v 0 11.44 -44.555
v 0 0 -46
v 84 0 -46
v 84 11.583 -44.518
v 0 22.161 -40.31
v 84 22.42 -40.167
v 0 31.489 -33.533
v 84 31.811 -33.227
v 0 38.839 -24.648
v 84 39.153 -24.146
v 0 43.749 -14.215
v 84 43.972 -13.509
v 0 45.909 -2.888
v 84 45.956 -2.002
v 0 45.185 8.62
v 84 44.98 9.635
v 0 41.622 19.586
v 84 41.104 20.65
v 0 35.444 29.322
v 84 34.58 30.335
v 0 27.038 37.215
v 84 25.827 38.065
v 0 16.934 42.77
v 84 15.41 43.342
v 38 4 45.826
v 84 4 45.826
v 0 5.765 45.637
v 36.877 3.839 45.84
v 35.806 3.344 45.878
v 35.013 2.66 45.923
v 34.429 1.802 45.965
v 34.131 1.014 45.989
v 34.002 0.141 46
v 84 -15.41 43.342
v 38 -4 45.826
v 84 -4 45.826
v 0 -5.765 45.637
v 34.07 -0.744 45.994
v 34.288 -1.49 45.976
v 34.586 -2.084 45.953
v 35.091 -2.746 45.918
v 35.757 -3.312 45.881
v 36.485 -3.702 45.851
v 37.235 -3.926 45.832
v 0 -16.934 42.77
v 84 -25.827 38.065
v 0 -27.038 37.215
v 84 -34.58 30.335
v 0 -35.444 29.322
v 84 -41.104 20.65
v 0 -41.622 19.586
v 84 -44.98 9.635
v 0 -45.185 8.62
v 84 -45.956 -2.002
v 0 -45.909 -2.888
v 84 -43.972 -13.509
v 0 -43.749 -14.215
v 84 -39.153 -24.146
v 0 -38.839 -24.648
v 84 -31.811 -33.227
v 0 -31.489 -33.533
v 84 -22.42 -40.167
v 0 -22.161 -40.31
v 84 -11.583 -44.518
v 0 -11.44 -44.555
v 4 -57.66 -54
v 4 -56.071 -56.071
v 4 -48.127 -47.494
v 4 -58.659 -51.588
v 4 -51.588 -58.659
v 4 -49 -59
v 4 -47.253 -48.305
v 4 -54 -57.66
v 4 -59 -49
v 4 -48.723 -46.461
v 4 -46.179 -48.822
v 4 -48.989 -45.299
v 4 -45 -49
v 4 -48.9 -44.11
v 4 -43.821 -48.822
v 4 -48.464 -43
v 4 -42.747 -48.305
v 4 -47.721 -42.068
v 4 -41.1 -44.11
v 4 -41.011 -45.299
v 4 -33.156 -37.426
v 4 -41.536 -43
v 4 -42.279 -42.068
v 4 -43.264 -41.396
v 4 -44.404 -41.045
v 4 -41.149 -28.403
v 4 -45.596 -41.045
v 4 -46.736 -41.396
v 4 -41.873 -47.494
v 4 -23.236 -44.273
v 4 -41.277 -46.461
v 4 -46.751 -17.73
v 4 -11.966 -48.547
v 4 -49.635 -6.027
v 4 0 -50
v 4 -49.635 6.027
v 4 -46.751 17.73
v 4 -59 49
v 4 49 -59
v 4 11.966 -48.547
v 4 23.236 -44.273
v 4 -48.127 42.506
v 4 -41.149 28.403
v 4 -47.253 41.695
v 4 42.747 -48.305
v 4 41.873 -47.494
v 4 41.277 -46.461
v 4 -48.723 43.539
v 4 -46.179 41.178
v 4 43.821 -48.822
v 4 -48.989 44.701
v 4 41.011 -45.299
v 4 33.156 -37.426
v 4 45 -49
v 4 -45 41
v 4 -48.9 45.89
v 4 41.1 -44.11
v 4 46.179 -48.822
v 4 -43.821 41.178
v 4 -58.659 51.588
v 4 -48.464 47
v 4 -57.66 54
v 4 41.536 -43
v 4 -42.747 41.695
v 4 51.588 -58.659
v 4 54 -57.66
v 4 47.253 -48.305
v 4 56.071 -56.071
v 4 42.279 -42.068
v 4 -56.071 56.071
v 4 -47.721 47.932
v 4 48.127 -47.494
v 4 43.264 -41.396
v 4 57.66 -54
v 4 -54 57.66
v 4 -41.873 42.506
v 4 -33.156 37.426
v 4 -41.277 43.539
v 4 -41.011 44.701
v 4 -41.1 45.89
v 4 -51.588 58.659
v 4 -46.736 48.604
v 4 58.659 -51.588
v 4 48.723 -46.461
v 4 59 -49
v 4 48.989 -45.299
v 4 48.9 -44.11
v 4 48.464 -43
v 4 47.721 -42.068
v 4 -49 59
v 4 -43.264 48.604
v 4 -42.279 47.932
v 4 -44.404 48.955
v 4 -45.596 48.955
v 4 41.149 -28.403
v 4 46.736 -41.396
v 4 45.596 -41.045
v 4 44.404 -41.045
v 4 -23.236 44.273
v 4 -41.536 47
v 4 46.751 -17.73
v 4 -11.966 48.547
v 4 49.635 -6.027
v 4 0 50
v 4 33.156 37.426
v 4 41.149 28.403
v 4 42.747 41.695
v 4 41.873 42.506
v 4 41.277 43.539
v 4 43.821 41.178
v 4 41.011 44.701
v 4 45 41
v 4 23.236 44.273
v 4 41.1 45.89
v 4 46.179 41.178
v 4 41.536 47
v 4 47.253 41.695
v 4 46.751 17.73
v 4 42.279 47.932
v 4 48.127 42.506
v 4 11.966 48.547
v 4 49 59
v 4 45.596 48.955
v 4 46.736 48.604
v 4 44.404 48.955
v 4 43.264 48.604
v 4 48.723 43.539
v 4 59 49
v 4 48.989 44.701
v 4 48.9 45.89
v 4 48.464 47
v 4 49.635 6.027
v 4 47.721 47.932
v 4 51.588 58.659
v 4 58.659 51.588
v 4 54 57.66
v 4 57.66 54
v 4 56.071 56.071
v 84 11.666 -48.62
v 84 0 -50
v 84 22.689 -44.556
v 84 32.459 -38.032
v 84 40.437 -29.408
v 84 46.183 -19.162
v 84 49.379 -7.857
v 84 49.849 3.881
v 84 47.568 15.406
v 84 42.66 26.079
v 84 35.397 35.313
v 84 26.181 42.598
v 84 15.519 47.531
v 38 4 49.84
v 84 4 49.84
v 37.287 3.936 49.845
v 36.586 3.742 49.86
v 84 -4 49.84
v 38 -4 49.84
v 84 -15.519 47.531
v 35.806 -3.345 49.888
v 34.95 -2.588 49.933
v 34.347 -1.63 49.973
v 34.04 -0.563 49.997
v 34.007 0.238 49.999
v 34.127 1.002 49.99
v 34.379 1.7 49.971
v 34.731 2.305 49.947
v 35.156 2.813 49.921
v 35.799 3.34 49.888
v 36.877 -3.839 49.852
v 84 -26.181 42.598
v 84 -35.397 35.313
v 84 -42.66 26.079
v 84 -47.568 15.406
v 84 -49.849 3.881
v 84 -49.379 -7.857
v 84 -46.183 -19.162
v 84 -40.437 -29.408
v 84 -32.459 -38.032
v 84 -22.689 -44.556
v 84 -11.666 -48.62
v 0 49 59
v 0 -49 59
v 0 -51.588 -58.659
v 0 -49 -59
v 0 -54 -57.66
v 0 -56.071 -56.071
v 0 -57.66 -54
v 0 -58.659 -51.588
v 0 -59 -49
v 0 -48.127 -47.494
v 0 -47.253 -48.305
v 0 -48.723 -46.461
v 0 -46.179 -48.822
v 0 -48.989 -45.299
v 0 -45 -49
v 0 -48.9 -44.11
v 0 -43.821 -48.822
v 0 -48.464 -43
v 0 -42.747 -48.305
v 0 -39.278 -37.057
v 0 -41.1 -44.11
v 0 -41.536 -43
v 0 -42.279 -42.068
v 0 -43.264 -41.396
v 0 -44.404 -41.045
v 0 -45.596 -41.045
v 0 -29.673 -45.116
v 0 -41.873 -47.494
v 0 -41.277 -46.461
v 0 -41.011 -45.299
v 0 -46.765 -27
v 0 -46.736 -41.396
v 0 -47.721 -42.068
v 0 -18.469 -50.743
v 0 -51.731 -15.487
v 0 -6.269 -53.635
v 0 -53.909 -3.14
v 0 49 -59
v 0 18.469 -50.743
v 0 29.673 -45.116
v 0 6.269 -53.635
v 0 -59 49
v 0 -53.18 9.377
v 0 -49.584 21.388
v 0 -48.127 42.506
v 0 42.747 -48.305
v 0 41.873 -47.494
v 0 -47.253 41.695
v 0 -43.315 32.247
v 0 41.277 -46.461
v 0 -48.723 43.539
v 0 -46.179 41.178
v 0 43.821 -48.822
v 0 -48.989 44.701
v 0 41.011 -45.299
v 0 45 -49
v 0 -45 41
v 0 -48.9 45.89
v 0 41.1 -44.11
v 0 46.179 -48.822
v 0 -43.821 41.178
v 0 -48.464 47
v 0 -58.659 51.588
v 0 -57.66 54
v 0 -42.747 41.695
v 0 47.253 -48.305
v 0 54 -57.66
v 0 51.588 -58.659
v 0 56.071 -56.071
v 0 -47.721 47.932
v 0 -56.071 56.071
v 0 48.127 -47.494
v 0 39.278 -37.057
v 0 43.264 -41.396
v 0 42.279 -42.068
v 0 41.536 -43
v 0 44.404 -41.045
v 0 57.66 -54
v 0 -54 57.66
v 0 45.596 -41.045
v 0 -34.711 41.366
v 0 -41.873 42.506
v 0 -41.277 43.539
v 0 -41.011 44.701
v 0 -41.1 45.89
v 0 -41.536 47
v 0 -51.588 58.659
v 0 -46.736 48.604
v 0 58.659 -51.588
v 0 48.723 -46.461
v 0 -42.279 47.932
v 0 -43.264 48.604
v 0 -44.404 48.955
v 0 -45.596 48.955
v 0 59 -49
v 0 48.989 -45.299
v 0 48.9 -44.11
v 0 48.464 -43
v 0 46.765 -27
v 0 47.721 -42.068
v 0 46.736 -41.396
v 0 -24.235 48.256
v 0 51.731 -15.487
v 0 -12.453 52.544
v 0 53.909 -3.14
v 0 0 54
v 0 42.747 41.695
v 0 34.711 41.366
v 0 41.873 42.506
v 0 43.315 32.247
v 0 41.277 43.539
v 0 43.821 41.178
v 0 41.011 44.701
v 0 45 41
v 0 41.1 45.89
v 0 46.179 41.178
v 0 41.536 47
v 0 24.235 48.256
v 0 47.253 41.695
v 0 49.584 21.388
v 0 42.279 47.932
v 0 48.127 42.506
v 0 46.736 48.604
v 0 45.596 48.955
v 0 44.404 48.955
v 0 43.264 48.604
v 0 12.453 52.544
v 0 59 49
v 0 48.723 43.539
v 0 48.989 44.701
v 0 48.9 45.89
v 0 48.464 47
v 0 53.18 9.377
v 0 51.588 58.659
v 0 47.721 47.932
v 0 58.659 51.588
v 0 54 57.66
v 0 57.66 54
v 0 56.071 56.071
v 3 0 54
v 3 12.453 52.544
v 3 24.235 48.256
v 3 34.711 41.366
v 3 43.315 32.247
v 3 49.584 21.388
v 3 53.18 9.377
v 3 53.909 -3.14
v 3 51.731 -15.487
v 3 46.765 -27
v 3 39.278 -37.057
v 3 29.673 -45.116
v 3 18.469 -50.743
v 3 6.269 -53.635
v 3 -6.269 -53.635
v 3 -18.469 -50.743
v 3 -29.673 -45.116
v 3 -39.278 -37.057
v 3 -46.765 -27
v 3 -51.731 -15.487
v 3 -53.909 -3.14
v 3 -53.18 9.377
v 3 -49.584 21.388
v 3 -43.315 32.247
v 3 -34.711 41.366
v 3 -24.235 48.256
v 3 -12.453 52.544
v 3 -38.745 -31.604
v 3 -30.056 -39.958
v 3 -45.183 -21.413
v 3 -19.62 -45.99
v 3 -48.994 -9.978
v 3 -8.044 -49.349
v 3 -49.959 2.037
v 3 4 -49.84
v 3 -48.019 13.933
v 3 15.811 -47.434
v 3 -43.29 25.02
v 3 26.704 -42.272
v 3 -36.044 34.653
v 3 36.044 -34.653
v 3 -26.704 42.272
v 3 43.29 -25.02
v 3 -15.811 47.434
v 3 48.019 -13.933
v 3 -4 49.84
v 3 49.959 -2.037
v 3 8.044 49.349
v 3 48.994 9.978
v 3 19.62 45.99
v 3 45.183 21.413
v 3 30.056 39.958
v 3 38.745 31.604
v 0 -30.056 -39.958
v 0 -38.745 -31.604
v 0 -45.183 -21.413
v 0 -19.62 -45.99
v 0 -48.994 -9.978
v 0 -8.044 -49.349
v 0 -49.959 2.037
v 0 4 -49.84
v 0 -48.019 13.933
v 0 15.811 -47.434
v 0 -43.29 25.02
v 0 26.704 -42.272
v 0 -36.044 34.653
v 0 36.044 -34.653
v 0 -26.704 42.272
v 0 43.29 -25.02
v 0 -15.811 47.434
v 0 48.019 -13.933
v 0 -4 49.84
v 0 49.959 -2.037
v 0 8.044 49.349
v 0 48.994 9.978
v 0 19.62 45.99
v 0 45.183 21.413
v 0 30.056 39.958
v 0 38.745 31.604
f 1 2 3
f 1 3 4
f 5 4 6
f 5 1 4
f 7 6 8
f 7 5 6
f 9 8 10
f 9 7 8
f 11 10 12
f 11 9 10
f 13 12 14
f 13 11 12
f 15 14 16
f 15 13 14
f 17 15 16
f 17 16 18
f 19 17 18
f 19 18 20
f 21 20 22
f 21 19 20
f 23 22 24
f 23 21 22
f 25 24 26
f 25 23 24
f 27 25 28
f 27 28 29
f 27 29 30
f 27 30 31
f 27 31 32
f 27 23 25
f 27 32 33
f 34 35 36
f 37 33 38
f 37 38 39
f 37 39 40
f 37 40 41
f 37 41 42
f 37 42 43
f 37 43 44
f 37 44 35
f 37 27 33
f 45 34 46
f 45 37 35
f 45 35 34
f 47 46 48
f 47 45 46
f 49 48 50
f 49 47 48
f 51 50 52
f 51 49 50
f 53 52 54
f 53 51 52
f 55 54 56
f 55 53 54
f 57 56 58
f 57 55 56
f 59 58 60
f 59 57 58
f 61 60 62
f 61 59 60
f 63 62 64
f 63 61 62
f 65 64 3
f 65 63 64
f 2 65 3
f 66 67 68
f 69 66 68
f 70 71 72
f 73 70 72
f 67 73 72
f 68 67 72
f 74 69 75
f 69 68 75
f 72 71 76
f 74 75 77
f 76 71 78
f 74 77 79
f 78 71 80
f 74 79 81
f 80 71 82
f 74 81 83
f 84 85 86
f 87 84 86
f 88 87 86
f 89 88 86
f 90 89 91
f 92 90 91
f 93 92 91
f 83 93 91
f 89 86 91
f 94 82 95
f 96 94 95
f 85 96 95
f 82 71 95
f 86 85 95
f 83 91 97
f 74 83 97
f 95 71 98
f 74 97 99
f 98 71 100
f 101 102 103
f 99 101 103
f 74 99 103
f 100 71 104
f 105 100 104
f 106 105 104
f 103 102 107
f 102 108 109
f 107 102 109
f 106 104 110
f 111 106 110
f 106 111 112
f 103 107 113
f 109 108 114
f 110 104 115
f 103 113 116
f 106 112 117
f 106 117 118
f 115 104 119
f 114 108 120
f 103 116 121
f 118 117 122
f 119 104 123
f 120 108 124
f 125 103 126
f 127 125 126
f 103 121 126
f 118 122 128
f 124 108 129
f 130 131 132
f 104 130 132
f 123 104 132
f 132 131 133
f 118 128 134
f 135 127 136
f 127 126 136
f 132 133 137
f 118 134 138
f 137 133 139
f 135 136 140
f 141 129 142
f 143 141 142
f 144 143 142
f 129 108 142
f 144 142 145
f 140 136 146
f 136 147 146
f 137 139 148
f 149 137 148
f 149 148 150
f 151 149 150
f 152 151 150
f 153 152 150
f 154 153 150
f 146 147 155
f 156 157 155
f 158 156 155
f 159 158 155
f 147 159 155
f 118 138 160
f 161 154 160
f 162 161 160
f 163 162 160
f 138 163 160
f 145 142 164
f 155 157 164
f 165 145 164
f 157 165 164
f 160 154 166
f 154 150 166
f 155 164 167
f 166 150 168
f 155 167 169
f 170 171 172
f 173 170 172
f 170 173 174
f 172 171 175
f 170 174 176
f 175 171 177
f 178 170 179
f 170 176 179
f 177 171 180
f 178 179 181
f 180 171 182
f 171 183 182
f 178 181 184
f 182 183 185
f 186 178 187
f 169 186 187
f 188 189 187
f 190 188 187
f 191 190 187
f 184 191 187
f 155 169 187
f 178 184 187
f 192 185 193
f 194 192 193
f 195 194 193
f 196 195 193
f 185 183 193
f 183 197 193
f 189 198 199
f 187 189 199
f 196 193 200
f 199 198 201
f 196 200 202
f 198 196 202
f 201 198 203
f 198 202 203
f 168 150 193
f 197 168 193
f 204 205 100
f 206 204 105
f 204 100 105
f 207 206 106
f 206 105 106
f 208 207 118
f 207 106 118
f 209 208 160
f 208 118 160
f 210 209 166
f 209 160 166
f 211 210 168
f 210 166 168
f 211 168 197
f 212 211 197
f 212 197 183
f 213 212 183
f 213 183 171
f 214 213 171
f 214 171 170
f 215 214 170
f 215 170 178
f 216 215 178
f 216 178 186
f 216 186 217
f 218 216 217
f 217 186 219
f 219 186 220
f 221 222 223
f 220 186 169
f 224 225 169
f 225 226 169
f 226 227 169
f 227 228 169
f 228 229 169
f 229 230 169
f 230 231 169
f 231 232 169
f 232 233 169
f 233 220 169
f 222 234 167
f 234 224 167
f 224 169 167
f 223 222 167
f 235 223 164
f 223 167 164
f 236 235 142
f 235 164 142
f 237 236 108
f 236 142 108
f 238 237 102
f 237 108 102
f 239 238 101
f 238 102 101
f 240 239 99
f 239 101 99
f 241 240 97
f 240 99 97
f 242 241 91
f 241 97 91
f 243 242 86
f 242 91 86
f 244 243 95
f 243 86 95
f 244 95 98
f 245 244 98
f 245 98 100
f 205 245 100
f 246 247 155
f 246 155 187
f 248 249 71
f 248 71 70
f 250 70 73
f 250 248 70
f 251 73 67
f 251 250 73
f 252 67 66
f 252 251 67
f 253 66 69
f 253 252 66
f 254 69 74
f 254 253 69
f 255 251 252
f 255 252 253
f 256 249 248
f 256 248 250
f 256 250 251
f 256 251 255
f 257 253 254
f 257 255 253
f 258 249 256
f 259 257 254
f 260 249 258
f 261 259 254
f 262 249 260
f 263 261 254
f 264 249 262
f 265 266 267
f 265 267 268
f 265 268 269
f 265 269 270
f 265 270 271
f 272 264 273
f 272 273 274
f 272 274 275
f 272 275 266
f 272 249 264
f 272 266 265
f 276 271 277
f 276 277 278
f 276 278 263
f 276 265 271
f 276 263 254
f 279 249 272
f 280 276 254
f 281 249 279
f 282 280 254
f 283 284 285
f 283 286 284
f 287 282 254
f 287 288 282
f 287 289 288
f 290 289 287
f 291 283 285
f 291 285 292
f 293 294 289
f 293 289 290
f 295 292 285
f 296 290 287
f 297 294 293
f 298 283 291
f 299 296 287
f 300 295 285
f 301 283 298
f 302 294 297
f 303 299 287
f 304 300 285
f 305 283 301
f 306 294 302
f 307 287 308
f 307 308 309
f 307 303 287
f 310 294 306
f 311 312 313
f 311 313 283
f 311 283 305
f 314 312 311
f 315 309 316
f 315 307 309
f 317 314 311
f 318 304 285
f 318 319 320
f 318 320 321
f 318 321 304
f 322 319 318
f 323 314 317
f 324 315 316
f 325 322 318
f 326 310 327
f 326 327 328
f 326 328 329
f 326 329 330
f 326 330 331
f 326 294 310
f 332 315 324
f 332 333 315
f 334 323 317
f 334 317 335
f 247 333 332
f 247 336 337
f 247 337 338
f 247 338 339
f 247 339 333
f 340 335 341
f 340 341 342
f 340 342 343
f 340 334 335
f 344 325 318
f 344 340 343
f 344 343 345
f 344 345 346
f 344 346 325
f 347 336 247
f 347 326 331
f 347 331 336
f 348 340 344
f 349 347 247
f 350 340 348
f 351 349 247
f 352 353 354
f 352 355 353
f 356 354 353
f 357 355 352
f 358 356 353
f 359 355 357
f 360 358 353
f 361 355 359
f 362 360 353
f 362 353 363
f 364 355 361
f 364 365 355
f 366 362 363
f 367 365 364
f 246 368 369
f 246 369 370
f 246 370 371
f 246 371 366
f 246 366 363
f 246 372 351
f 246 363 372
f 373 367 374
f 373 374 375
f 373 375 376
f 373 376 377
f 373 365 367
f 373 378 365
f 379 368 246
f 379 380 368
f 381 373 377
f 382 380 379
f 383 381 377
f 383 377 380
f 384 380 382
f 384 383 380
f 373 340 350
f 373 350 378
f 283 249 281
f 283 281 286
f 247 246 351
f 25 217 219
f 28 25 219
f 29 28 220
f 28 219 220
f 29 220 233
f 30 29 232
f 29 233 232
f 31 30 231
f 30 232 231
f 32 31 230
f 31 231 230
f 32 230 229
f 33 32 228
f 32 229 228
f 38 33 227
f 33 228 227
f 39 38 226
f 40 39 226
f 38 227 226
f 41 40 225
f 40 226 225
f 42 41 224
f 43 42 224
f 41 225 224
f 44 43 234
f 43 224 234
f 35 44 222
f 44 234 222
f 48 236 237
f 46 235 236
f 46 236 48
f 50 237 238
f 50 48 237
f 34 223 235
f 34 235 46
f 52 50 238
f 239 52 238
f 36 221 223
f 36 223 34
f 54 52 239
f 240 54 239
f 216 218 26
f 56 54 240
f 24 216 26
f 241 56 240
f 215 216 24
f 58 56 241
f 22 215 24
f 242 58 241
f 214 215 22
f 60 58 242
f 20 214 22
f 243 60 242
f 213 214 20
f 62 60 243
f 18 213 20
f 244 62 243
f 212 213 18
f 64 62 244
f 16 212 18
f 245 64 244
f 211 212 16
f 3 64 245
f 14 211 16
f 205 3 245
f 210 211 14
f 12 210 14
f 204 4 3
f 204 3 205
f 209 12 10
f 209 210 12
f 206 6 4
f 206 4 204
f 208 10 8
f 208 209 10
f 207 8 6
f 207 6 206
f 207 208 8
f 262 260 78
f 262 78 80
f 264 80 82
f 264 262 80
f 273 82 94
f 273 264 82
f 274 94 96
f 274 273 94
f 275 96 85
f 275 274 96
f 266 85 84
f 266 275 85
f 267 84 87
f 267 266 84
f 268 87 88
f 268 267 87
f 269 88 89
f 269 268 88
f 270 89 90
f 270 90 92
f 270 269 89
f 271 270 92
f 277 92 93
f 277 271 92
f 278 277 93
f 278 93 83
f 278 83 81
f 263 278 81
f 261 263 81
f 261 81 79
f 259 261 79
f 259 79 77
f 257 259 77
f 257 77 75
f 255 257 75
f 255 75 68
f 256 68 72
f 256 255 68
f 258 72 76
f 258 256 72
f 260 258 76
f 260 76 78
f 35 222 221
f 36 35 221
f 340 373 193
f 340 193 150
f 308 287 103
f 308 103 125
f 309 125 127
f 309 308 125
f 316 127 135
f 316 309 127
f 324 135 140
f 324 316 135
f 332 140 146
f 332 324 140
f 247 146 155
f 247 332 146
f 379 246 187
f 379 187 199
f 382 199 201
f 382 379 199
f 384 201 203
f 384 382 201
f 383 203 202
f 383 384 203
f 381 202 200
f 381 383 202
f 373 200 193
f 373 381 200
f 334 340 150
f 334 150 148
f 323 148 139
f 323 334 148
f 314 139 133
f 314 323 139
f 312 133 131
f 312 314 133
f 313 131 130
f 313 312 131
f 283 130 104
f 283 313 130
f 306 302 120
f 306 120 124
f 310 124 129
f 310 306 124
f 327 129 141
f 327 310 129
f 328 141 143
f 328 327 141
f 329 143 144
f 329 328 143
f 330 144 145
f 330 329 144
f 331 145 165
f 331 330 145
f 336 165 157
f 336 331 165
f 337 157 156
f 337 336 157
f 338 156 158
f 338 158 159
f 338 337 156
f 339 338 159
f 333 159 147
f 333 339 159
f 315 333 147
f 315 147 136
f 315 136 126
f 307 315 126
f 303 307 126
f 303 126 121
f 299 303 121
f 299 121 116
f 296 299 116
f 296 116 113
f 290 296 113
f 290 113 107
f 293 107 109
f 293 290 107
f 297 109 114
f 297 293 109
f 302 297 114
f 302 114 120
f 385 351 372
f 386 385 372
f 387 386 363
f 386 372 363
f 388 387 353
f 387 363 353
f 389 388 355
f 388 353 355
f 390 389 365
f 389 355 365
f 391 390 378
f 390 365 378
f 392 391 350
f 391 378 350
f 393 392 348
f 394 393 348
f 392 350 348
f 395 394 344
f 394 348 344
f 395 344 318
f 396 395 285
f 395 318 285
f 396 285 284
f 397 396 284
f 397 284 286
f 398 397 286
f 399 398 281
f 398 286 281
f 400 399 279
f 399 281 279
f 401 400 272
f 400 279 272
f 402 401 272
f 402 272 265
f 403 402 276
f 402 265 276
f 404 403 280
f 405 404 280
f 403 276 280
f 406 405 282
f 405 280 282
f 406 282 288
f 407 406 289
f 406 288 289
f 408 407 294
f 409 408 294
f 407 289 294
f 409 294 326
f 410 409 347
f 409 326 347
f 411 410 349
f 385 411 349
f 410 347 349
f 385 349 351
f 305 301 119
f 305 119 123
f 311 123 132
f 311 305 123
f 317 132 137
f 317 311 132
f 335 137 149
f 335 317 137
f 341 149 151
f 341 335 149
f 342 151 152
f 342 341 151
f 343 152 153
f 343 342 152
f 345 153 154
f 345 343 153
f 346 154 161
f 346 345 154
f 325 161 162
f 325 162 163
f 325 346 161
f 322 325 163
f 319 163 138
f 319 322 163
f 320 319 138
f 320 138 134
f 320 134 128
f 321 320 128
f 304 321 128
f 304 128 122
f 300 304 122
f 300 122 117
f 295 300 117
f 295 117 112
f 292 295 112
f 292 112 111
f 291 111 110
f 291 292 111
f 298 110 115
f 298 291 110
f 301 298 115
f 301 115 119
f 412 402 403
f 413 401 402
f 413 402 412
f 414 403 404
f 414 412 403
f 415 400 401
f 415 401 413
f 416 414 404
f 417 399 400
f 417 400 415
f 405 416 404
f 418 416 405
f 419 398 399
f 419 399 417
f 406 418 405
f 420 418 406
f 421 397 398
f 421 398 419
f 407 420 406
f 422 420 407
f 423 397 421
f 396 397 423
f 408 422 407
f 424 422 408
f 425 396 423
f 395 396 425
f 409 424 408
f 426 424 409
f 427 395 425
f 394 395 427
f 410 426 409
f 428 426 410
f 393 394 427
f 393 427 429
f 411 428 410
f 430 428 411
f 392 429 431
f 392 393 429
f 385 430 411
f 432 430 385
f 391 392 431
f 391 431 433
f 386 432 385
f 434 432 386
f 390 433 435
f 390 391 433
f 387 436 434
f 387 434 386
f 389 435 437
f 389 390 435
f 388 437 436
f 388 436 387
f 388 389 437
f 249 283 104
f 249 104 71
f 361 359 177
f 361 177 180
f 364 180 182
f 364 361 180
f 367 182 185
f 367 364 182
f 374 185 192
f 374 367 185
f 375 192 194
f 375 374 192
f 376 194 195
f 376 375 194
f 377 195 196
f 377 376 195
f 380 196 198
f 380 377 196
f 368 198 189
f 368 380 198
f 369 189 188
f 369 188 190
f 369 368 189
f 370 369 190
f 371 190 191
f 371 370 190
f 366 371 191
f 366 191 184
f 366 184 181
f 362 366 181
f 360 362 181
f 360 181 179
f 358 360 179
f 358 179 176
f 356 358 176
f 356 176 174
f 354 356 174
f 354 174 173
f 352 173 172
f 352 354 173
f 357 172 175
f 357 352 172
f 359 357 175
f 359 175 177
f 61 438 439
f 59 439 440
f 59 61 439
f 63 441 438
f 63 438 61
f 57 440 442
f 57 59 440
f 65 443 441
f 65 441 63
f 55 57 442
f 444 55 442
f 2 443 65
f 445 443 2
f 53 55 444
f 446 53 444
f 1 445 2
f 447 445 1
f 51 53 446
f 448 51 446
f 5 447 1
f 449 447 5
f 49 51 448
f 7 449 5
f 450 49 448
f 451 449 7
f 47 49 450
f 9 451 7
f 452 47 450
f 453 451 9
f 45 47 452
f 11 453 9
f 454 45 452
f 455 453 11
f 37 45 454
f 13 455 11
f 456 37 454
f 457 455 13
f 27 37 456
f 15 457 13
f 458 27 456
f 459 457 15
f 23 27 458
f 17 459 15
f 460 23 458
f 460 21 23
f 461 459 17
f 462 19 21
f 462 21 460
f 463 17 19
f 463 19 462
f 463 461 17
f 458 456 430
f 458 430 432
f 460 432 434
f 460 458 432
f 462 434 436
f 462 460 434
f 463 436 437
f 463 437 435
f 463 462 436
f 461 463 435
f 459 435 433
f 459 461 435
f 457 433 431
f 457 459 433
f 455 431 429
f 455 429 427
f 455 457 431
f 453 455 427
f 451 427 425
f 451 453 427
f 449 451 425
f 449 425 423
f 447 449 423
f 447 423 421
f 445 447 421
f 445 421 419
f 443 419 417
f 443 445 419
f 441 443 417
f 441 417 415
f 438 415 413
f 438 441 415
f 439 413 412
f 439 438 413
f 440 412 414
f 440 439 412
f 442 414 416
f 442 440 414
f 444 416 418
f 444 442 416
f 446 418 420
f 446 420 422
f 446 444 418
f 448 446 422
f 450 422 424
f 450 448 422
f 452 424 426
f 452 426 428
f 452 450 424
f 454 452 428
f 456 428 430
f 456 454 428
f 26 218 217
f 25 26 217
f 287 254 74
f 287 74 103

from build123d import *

# Parameters (mm, degrees)
CROQUIS1_R              = 46
CROQUIS1_R_2            = 4
SALIENTE_EXTRUIR1_DEPTH = 4
CROQUIS2_R              = 50
CROQUIS2_R_2            = 46
SALIENTE_EXTRUIR2_DEPTH = 80
CORTAR_EXTRUIR1_DEPTH   = 10
CROQUIS4_R              = 54
CROQUIS4_R_2            = 50
CORTAR_EXTRUIR2_DEPTH   = 3


with BuildPart() as part:
    # Croquis1 → Saliente-Extruir1 (new body)
    with BuildSketch(Plane(origin=(0, 0, 0), x_dir=(0, 0, -1), z_dir=(1, 0, 0))):
        with BuildLine():
            Line((-49, 59), (49, 59))
            ThreePointArc((49, 59), (56.071067812, 56.071067812), (59, 49))
            Line((59, 49), (59, -49))
            ThreePointArc((59, -49), (56.071067812, -56.071067812), (49, -59))
            Line((49, -59), (-49, -59))
            ThreePointArc((-49, -59), (-56.071067812, -56.071067812), (-59, -49))
            Line((-59, -49), (-59, 49))
            ThreePointArc((-59, 49), (-56.071067812, 56.071067812), (-49, 59))
        make_face()
        Circle(CROQUIS1_R, mode=Mode.SUBTRACT)
        with Locations((45, -45)):
            Circle(CROQUIS1_R_2, mode=Mode.SUBTRACT)
        with Locations((-45, -45)):
            Circle(CROQUIS1_R_2, mode=Mode.SUBTRACT)
        with Locations((-45, 45)):
            Circle(CROQUIS1_R_2, mode=Mode.SUBTRACT)
        with Locations((45, 45)):
            Circle(CROQUIS1_R_2, mode=Mode.SUBTRACT)
    extrude(amount=SALIENTE_EXTRUIR1_DEPTH)

    # Croquis2 → Saliente-Extruir2 (add)
    with BuildSketch(Plane(origin=(4, 0, 0), x_dir=(0, 0, -1), z_dir=(1, 0, 0))):
        Circle(CROQUIS2_R)
        Circle(CROQUIS2_R_2, mode=Mode.SUBTRACT)
    extrude(amount=SALIENTE_EXTRUIR2_DEPTH)

    # Croquis3 → Cortar-Extruir1 (cut)
    with BuildSketch(Plane.XY.offset(50)):
        with BuildLine():
            Line((84, 0), (84, 4))
            Line((84, 4), (38, 4))
            ThreePointArc((38, 4), (34, 0), (38, -4))
            Line((38, -4), (84, -4))
            Line((84, -4), (84, 0))
        make_face()
    extrude(amount=-CORTAR_EXTRUIR1_DEPTH, mode=Mode.SUBTRACT)

    # Croquis4 → Cortar-Extruir2 (cut)
    with BuildSketch(Plane.ZY):
        Circle(CROQUIS4_R)
        with Locations(Location((0, 0, 0), (0, 0, 355.411434264))):
            Circle(CROQUIS4_R_2, mode=Mode.SUBTRACT)
    extrude(amount=-CORTAR_EXTRUIR2_DEPTH, mode=Mode.SUBTRACT)


solid = part.part
